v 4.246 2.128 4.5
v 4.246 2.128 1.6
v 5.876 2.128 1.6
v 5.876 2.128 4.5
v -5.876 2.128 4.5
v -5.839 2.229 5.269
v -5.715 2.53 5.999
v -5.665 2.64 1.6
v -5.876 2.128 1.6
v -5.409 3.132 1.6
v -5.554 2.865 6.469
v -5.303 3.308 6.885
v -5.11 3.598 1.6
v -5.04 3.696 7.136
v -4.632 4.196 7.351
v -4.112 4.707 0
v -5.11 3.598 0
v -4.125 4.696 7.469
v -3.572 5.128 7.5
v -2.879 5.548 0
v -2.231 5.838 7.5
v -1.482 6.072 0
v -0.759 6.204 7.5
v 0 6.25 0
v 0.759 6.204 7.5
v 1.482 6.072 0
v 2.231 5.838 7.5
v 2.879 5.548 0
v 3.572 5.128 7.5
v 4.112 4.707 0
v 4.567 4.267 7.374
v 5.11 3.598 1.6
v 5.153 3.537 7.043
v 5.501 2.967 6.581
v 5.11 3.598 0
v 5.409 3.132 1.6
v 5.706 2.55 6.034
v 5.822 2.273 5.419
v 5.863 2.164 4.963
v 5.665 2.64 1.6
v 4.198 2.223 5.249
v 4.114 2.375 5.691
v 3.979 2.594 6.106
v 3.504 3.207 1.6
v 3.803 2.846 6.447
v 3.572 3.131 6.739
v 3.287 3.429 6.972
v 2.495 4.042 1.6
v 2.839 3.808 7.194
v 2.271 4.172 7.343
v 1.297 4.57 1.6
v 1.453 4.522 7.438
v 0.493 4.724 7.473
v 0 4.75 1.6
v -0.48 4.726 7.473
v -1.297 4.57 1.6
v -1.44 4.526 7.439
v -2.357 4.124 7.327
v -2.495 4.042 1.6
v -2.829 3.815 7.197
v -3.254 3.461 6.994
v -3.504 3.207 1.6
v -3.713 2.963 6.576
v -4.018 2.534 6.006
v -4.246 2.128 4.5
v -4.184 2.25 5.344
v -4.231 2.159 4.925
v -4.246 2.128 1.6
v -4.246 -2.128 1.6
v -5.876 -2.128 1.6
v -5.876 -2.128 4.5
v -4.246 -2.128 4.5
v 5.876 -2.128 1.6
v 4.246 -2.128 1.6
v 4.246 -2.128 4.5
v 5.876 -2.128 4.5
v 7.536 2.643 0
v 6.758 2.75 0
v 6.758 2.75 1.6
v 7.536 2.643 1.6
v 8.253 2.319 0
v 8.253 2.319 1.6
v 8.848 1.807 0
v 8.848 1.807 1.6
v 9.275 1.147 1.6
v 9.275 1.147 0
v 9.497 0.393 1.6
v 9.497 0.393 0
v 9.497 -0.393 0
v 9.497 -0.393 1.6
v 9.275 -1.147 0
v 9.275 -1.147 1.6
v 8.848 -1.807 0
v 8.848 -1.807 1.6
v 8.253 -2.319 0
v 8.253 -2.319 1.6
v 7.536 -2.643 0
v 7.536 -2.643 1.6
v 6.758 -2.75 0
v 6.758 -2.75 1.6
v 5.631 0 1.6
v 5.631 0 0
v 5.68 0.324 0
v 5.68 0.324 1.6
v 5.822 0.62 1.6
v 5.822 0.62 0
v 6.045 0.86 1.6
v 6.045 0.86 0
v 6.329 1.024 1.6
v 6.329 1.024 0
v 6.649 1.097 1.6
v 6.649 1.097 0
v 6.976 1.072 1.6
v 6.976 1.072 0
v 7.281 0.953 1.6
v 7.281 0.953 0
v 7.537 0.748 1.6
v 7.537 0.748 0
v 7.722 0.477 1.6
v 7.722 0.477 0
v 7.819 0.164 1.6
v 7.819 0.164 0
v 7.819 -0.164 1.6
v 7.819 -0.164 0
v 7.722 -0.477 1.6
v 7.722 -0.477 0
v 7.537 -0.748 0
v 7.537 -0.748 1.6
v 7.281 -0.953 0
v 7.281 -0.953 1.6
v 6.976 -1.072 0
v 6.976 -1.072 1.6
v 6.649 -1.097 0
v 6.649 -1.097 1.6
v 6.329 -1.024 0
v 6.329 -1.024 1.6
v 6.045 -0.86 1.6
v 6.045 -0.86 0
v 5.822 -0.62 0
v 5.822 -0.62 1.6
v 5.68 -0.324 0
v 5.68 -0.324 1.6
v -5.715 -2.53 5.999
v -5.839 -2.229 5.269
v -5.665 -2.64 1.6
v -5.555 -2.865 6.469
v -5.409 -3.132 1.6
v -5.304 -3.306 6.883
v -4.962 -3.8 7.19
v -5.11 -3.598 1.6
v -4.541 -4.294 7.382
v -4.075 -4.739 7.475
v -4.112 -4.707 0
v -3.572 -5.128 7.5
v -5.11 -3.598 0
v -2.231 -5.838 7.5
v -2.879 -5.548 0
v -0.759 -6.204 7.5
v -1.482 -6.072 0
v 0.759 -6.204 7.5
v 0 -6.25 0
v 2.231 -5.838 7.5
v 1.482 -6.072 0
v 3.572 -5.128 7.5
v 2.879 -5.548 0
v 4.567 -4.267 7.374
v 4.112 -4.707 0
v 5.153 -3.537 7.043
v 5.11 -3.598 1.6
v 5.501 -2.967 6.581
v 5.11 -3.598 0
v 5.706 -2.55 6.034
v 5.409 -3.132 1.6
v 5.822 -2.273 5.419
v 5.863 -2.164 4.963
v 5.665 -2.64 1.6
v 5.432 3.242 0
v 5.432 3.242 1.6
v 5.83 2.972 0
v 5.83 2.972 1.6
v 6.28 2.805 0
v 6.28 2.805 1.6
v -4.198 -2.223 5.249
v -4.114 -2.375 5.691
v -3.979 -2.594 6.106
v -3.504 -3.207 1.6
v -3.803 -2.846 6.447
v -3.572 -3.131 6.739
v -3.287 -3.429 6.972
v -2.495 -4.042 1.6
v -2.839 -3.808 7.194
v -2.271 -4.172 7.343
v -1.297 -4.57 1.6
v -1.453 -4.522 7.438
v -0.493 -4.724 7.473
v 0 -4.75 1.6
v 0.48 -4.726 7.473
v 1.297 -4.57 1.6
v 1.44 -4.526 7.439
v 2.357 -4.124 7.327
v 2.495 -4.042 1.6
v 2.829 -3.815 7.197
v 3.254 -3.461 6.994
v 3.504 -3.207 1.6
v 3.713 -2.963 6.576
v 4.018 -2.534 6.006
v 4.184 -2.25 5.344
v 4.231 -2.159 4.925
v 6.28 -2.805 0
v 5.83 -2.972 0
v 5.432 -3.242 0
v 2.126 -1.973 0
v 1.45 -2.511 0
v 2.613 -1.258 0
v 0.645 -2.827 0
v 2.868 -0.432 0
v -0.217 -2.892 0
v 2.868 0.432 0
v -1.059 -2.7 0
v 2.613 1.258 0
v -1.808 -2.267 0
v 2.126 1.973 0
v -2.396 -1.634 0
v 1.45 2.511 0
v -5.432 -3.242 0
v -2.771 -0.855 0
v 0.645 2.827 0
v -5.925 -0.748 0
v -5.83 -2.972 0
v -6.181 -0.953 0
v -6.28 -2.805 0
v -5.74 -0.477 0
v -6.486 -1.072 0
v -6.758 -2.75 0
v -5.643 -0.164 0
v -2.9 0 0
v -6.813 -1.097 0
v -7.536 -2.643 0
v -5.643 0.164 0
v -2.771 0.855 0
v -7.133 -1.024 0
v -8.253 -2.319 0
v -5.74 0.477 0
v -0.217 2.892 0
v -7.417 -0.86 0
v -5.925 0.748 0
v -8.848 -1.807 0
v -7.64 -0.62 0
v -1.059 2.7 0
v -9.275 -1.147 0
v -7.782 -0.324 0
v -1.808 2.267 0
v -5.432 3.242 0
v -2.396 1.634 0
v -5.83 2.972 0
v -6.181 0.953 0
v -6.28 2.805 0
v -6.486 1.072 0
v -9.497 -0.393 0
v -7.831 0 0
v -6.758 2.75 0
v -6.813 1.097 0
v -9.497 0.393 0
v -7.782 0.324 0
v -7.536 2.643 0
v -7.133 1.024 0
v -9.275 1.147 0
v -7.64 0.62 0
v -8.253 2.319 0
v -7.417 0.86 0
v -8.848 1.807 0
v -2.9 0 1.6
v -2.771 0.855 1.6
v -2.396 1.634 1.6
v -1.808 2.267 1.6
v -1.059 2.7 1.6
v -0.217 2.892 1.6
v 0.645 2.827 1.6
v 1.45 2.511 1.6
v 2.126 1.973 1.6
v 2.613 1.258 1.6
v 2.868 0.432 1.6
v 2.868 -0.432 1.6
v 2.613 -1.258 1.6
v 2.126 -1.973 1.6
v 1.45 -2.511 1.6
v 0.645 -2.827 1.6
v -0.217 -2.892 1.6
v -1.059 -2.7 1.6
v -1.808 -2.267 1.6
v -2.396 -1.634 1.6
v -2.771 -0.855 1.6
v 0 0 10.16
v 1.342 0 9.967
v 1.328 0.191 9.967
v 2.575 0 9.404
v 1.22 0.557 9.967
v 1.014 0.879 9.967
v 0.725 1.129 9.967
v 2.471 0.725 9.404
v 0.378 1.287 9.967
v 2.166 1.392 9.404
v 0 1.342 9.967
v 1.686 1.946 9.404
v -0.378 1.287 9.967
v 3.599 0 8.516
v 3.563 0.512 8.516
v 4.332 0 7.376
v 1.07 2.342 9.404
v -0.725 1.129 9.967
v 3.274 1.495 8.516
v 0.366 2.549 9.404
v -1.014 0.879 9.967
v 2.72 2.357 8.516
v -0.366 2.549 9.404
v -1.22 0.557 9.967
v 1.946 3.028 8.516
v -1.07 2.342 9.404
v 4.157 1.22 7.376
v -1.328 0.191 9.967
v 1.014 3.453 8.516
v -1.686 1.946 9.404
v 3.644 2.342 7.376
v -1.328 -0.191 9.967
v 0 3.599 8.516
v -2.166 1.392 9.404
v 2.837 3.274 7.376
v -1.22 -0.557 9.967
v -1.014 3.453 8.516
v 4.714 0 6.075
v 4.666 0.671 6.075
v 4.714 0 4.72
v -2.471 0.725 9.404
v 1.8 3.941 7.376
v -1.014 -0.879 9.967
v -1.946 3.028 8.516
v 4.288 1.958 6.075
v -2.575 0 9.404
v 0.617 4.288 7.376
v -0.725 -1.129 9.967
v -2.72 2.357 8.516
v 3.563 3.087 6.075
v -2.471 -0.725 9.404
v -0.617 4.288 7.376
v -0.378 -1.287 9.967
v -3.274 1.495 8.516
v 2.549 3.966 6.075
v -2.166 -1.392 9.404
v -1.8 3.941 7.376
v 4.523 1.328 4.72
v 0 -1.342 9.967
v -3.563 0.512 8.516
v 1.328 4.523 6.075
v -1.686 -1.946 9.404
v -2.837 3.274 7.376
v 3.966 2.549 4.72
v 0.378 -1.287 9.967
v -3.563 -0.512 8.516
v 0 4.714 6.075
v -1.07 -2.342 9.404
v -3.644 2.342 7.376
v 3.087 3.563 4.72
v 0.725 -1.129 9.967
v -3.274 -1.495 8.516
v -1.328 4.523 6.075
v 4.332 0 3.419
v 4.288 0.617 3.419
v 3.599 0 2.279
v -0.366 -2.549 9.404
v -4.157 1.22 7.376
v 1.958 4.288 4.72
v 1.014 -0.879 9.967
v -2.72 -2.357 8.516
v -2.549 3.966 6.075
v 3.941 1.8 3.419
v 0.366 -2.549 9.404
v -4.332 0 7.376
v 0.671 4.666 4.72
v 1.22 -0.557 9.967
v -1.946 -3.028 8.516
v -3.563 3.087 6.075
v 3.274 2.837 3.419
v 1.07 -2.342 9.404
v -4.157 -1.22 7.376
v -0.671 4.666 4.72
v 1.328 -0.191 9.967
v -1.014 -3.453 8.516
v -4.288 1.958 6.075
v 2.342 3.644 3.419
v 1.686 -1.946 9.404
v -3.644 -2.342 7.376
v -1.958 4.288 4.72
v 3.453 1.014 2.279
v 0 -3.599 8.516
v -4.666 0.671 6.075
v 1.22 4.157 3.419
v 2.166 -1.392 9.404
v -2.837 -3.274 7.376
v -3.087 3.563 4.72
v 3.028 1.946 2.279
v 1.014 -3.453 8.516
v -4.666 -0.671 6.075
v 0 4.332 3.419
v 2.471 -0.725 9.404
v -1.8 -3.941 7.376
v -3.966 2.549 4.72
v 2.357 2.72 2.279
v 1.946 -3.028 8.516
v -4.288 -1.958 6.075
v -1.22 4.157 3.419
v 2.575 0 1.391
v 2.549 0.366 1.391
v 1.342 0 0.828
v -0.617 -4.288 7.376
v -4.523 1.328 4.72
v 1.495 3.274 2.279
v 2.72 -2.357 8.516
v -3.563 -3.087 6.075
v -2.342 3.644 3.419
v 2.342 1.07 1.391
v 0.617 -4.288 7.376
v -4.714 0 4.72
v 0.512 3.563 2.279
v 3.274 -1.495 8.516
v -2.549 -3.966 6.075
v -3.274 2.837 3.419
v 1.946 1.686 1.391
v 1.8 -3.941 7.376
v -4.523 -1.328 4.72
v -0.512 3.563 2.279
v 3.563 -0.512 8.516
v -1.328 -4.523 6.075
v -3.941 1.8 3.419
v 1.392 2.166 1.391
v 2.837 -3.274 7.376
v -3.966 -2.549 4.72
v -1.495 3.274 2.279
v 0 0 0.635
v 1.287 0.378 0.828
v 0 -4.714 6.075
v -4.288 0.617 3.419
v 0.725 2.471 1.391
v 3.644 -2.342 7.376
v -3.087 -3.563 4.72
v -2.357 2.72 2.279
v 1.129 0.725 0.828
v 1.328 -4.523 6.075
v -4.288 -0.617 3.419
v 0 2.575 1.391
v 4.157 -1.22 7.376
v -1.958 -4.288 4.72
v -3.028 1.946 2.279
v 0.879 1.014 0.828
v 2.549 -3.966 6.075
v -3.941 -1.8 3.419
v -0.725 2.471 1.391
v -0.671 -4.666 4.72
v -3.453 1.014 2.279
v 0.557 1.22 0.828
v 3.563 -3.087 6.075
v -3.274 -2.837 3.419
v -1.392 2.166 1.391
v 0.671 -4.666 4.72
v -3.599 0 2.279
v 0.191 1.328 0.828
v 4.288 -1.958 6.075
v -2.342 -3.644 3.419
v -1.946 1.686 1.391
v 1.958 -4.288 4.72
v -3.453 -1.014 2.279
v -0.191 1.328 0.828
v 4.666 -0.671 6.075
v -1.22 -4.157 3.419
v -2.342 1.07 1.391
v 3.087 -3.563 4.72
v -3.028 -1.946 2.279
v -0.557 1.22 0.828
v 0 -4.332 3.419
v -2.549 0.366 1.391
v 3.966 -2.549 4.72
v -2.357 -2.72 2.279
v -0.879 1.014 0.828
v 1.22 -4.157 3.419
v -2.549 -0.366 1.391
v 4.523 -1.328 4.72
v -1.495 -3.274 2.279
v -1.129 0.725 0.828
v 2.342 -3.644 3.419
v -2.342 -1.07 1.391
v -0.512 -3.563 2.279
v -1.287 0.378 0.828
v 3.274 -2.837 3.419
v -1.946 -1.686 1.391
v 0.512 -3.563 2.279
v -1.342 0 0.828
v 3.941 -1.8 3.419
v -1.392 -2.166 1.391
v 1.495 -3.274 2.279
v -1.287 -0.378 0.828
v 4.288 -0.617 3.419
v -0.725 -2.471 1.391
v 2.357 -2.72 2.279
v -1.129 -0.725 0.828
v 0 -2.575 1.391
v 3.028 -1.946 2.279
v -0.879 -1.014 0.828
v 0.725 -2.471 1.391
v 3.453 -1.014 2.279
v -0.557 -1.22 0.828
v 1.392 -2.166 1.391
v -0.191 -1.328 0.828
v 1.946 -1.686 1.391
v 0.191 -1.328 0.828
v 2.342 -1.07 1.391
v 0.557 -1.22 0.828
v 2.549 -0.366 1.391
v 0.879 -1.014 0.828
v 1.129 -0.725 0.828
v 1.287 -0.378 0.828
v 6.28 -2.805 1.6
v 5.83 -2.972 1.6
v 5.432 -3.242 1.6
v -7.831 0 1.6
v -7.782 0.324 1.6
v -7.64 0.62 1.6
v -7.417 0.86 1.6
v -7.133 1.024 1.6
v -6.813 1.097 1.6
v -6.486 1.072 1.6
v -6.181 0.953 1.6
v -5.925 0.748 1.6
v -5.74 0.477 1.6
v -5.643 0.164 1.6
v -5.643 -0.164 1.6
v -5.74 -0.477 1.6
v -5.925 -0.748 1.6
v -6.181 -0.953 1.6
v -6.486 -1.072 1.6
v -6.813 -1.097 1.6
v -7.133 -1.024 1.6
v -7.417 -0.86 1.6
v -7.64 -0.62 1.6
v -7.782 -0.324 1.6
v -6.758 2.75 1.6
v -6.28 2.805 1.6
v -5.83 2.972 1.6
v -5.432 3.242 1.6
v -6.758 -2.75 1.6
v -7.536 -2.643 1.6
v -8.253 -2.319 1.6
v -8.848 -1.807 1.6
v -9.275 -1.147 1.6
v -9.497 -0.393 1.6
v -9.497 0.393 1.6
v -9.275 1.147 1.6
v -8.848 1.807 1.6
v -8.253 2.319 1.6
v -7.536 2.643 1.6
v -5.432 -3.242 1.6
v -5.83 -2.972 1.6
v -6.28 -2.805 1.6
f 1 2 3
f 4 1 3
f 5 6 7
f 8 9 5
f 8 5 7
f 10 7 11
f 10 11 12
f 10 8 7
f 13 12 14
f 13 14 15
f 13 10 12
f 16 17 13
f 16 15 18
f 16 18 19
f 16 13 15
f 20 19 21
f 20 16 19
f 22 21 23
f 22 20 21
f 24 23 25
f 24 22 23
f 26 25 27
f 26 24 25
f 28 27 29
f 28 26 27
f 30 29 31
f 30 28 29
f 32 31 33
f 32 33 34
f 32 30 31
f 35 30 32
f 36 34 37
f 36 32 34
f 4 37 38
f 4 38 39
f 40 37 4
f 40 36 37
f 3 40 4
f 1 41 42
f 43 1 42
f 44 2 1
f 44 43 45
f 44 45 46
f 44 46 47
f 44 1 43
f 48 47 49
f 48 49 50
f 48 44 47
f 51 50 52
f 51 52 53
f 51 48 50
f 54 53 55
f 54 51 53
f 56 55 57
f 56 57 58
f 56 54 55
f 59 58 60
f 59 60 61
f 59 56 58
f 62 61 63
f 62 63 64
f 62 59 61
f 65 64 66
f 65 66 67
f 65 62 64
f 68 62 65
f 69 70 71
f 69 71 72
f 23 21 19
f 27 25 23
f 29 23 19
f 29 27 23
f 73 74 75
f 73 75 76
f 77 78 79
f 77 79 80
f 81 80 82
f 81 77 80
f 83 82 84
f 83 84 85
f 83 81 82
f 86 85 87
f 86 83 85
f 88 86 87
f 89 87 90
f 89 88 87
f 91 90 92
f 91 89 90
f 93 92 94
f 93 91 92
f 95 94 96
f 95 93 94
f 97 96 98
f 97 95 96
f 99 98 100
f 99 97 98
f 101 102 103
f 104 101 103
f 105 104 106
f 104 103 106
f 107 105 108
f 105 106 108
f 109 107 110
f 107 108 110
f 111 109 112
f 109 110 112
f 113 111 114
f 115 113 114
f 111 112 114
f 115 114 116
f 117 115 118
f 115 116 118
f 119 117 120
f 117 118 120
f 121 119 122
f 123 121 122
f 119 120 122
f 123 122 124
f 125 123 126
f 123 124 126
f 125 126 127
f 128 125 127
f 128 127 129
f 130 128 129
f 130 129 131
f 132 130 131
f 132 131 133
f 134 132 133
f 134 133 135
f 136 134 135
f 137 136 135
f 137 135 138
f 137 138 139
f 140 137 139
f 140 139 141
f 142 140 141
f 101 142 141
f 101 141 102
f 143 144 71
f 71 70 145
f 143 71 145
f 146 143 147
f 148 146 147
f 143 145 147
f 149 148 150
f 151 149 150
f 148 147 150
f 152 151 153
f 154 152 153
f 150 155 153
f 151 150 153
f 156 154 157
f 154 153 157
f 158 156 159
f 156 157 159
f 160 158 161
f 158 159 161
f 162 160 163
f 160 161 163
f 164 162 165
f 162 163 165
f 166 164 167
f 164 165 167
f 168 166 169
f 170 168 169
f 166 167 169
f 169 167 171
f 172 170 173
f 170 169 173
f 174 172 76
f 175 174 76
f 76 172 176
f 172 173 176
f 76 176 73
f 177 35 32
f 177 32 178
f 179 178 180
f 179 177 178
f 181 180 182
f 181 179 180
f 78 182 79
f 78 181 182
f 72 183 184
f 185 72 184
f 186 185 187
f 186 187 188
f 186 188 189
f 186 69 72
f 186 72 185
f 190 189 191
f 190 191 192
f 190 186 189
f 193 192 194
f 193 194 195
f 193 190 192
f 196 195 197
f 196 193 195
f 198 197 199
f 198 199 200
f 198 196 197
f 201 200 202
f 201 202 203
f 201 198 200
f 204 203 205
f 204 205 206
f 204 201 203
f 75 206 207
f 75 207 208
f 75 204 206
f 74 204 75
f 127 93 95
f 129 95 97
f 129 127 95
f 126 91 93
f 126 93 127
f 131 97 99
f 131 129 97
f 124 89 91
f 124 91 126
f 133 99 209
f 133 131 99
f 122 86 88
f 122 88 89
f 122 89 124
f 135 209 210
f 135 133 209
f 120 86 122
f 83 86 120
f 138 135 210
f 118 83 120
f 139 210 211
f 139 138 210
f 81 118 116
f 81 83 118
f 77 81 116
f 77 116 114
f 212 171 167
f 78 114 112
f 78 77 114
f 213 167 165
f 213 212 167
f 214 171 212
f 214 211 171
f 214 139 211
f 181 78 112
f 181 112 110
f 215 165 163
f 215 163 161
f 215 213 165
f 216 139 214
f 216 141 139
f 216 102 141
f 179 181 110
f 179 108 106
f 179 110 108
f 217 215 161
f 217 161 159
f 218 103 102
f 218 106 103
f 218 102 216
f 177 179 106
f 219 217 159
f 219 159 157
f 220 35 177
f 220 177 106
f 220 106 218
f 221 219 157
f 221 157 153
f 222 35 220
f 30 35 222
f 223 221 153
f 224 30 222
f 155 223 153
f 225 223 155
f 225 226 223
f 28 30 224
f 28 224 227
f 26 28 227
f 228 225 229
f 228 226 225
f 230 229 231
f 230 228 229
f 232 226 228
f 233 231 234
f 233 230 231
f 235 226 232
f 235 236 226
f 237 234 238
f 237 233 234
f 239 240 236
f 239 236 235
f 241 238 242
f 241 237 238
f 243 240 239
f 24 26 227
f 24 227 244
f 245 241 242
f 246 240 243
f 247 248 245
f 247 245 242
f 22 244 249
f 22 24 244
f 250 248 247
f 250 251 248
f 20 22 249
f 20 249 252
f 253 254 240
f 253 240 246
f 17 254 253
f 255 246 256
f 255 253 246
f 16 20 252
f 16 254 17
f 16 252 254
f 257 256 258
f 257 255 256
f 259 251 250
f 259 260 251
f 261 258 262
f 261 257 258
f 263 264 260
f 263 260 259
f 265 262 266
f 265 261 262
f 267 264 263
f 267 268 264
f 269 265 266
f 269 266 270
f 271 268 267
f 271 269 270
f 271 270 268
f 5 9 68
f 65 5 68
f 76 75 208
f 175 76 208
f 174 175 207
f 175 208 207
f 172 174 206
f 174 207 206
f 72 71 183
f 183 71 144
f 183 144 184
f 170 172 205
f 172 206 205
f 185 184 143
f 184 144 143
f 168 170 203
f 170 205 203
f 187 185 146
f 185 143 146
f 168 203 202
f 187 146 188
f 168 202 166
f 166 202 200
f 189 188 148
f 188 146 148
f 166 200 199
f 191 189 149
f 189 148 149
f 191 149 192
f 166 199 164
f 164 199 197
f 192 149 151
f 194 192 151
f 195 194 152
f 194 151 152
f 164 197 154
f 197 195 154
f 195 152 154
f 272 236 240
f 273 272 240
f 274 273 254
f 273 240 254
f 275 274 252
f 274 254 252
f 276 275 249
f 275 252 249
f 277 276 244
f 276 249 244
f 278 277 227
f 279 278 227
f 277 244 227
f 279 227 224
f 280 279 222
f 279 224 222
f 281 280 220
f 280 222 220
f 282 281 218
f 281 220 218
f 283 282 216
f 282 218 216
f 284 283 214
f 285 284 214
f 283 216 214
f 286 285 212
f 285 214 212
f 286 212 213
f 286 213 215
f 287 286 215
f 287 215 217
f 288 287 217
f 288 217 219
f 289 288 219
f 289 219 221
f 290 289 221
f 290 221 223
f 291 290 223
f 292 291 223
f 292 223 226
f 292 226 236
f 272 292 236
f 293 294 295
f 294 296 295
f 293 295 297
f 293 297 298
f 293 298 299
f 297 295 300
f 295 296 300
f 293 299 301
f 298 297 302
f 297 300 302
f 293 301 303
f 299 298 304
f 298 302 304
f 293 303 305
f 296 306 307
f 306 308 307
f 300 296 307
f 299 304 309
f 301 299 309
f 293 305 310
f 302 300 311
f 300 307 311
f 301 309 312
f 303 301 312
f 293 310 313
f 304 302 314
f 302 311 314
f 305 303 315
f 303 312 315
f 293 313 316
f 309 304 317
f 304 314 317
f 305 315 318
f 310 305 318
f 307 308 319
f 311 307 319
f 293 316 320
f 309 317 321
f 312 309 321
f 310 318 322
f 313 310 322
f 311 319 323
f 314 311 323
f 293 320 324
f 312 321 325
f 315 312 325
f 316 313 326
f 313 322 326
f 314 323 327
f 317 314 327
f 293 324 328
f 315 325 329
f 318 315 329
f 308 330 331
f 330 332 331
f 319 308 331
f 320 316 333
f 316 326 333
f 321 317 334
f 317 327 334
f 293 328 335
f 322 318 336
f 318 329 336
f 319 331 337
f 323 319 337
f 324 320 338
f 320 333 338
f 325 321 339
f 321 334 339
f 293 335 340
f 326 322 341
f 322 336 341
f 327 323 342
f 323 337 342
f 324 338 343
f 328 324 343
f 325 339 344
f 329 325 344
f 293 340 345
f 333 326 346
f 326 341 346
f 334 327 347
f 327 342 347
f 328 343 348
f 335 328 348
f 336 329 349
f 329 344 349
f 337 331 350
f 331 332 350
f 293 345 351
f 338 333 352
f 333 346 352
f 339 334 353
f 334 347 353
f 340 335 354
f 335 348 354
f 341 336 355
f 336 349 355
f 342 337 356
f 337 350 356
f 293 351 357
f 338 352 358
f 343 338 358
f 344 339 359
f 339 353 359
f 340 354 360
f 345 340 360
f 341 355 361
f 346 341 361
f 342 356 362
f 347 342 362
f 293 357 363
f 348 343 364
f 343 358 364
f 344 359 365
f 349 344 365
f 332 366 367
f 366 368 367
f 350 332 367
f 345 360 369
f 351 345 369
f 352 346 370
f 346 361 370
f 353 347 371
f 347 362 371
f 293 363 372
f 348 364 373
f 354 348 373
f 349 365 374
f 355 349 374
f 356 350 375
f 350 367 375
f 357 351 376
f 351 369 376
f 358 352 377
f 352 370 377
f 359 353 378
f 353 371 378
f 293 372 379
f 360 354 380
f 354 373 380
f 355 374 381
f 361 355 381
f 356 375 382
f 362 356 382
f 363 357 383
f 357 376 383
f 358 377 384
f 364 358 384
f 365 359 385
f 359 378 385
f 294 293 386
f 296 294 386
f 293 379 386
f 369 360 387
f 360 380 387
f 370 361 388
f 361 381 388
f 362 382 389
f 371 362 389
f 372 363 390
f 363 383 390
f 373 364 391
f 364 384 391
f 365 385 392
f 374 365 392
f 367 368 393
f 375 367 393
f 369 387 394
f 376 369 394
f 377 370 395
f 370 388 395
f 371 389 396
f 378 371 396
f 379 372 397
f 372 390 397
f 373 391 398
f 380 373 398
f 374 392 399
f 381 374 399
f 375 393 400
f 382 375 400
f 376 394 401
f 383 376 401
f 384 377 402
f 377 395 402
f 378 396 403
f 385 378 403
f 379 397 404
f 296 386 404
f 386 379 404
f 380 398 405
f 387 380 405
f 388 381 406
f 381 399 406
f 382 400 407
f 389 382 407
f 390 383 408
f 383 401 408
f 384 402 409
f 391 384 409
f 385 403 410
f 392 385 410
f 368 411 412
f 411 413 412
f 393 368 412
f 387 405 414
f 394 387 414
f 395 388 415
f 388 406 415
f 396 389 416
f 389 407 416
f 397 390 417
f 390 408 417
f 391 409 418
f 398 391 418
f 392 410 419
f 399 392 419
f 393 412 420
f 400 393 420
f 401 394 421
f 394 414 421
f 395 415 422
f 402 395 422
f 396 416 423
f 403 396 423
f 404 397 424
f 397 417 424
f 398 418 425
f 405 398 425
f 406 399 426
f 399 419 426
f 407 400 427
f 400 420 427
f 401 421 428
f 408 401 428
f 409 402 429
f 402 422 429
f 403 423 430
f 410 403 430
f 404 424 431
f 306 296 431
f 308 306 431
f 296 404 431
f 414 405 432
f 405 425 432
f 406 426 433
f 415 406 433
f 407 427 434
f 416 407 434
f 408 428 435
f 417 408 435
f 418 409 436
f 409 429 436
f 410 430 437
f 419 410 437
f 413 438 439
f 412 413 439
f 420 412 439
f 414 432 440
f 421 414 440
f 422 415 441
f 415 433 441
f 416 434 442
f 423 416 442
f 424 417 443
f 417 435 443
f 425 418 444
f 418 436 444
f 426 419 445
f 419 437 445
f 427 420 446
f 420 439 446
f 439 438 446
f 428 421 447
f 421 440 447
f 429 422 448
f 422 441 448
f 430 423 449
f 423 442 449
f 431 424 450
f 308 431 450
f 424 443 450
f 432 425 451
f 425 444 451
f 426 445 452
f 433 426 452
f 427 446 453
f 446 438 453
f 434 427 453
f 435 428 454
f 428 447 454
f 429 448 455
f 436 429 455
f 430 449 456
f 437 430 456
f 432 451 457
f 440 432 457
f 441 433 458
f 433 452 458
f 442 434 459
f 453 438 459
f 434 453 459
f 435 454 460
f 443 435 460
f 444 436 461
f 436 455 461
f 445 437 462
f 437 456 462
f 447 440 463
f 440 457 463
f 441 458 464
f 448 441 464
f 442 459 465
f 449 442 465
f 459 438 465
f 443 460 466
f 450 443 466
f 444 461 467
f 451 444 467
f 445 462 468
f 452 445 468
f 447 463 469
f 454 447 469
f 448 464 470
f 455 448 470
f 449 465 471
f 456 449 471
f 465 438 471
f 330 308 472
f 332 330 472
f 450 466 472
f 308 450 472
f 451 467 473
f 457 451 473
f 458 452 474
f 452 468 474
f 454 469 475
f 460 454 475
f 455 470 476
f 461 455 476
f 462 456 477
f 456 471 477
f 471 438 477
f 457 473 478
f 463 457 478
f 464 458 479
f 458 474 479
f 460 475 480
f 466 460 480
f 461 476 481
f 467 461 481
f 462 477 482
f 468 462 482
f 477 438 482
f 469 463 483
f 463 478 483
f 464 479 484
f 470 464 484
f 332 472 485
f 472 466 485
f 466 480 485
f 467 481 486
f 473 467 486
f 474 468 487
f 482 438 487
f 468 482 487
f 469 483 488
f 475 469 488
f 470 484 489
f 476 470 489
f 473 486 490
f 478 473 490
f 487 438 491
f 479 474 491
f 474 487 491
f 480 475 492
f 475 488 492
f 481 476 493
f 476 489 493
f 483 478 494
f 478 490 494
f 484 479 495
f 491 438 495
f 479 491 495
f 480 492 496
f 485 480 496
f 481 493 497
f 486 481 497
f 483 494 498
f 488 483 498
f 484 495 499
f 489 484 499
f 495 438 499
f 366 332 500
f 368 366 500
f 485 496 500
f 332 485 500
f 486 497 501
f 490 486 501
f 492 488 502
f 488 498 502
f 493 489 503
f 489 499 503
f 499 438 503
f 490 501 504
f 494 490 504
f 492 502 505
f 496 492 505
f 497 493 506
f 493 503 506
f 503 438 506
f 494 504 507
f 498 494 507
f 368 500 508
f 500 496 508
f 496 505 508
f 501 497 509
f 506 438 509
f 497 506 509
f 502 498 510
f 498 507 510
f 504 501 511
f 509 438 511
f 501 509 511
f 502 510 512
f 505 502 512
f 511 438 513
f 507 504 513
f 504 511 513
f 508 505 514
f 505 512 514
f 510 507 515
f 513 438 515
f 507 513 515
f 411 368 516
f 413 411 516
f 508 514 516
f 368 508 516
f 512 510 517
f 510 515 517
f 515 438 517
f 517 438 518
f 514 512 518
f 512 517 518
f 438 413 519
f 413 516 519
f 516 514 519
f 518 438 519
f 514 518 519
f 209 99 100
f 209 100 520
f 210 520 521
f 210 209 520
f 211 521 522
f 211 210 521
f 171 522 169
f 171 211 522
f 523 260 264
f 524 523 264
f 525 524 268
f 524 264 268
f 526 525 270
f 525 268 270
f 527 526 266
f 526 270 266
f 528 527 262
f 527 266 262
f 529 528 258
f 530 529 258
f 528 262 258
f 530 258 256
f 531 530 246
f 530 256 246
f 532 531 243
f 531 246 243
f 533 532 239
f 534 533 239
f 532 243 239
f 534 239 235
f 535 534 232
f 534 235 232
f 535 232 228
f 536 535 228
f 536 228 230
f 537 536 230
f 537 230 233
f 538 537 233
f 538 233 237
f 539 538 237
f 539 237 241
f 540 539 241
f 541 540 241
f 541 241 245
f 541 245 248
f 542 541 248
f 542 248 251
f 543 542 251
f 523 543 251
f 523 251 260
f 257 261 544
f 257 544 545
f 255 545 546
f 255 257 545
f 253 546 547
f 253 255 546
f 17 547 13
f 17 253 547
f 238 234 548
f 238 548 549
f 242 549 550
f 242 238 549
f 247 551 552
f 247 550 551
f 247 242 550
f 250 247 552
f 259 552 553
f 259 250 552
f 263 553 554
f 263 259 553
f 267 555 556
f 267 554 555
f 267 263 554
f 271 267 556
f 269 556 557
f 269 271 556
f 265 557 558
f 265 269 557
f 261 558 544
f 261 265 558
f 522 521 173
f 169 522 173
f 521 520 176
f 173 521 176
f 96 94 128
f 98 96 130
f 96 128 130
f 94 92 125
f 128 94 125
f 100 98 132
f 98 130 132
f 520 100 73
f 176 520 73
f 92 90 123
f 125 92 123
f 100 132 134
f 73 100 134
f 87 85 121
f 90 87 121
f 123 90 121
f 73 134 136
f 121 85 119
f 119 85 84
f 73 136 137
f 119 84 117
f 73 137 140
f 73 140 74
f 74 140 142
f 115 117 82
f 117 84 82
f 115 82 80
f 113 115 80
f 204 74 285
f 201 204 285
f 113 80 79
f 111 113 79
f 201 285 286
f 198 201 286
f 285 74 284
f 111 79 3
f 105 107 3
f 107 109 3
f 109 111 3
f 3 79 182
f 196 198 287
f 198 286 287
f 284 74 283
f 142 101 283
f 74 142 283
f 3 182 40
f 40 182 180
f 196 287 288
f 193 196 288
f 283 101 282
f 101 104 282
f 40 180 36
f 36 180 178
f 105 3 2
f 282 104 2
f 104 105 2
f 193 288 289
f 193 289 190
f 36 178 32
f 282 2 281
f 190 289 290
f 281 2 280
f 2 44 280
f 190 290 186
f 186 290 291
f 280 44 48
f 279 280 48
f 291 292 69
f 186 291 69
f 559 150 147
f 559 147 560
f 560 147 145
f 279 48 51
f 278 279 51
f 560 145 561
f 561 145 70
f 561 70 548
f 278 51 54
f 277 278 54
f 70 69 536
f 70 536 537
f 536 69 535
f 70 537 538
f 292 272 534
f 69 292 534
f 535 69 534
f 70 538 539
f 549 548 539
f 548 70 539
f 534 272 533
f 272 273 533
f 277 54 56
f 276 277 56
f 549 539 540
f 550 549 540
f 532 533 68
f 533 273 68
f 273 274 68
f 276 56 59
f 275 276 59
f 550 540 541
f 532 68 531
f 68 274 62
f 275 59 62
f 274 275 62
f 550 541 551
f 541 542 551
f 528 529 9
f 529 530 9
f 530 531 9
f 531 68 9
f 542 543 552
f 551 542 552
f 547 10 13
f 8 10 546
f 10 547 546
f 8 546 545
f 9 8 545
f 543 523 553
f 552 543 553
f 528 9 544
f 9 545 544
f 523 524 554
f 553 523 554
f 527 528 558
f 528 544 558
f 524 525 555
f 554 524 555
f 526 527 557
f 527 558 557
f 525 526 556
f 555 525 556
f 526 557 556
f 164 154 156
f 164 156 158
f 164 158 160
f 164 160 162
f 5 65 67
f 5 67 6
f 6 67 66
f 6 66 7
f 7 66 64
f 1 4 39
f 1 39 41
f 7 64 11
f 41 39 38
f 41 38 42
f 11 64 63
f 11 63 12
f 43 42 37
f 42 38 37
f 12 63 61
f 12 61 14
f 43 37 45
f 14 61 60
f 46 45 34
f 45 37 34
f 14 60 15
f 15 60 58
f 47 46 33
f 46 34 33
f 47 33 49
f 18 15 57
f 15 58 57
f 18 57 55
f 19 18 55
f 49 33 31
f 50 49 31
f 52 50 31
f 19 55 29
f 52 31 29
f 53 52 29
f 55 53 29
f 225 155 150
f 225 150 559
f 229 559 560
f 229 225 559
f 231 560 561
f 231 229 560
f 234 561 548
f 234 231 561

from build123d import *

# Parameters (mm, degrees)
SKETCH1_R           = 6.25
SKETCH1_R_2         = 4.750000000000001
BOSS_EXTRUDE1_DEPTH = 7.5
SKETCH2_R           = 2.9
BOSS_EXTRUDE2_DEPTH = 1.6
SKETCH4_W           = 17.032561562560232
SKETCH4_H           = 4.256966638696863
CUT_EXTRUDE1_DEPTH  = 5.9
FILLET1_R           = 3
SKETCH5_R           = 1.1
SKETCH5_R_2         = 1.0999999999999992
CUT_EXTRUDE2_DEPTH  = 14.63957945649352


with BuildPart() as part:
    # Sketch1 → Boss-Extrude1 (new body)
    with BuildSketch(Plane.XY):
        Circle(SKETCH1_R)
        Circle(SKETCH1_R_2, mode=Mode.SUBTRACT)
    extrude(amount=BOSS_EXTRUDE1_DEPTH)

    # Sketch2 → Boss-Extrude2 (add)
    with BuildSketch(Plane(origin=(0, 0, 0), x_dir=(-1, 0, 0), z_dir=(0, 0, -1))):
        with BuildLine():
            ThreePointArc((-6.757882598562828, 2.7499467257690724), (-9.525000000000002, 3.4e-16), (-6.757882598562828, -2.7499467257690724))
            ThreePointArc((-6.757882598562828, -2.7499467257690724), (-5.829818598679689, -2.9718052821530714), (-5.110176954042268, -3.5984151370256456))
            ThreePointArc((-5.110176954042268, -3.5984151370256456), (3.8e-16, -6.250000000000001), (5.110176954042268, -3.5984151370256447))
            ThreePointArc((5.110176954042268, -3.5984151370256447), (5.829818598679689, -2.9718052821530705), (6.757882598562827, -2.7499467257690715))
            ThreePointArc((6.757882598562827, -2.7499467257690715), (9.525, 0), (6.757882598562827, 2.7499467257690715))
            ThreePointArc((6.757882598562827, 2.7499467257690715), (5.829818598679689, 2.9718052821530705), (5.110176954042268, 3.5984151370256447))
            ThreePointArc((5.110176954042268, 3.5984151370256447), (3.8e-16, 6.25), (-5.110176954042268, 3.5984151370256456))
            ThreePointArc((-5.110176954042268, 3.5984151370256456), (-5.829818598679689, 2.9718052821530714), (-6.757882598562828, 2.7499467257690724))
        make_face()
        Circle(SKETCH2_R, mode=Mode.SUBTRACT)
    extrude(amount=-BOSS_EXTRUDE2_DEPTH)

    # Sketch4 → Cut-Extrude1 (cut)
    with BuildSketch(Plane.XY.offset(7.5)):
        Rectangle(SKETCH4_W, SKETCH4_H)
    extrude(amount=-CUT_EXTRUDE1_DEPTH, mode=Mode.SUBTRACT)

    # Fillet1
    # the kernel refuses this fillet: 3 mm, written as the material it takes off along each edge
    with BuildSketch(Plane(origin=(-13.376398451369308, -2.1284833193484314, 7.5), x_dir=(0, 0, -1), z_dir=(1, 0, 0))) as fillet1_piece_1:
        with BuildLine():
            CenterArc((FILLET1_R, -FILLET1_R), FILLET1_R, 90, 90)
            Line((0, -FILLET1_R), (0, 0))
            Line((0, 0), (FILLET1_R, 0))
        make_face()
    extrude(amount=16.629981284008707, mode=Mode.SUBTRACT)
    with BuildSketch(Plane(origin=(-3.253582832639439, -2.1284833193484314, 7.5), x_dir=(0, -1, 0), z_dir=(1, 0, 0))) as fillet1_piece_2:
        with BuildLine():
            CenterArc((FILLET1_R, FILLET1_R), FILLET1_R, 180, 90)
            Line((0, FILLET1_R), (0, 0))
            Line((0, 0), (FILLET1_R, 0))
        make_face()
    extrude(amount=16.629981284008785, mode=Mode.SUBTRACT)
    with BuildSketch(Plane(origin=(13.376398451369345, 2.1284833193484314, 7.5), x_dir=(0, 0, -1), z_dir=(-1, 0, 0))) as fillet1_piece_3:
        with BuildLine():
            CenterArc((FILLET1_R, -FILLET1_R), FILLET1_R, 90, 90)
            Line((0, -FILLET1_R), (0, 0))
            Line((0, 0), (FILLET1_R, 0))
        make_face()
    extrude(amount=16.629981284008785, mode=Mode.SUBTRACT)
    with BuildSketch(Plane(origin=(3.253582832639398, 2.1284833193484314, 7.5), x_dir=(0, 1, 0), z_dir=(-1, 0, 0))) as fillet1_piece_4:
        with BuildLine():
            CenterArc((FILLET1_R, FILLET1_R), FILLET1_R, 180, 90)
            Line((0, FILLET1_R), (0, 0))
            Line((0, 0), (FILLET1_R, 0))
        make_face()
    extrude(amount=16.629981284008707, mode=Mode.SUBTRACT)

    # Sketch5 → Cut-Extrude2 (cut, through all)
    with BuildSketch(Plane(origin=(0, 0, 0), x_dir=(-1, 0, 0), z_dir=(0, 0, -1))):
        with Locations((-6.731, 0)):
            Circle(SKETCH5_R)
        with Locations((6.731, 0)):
            Circle(SKETCH5_R_2)
    extrude(amount=-CUT_EXTRUDE2_DEPTH, mode=Mode.SUBTRACT)


with BuildPart() as body_2:
    # Sketch6 → Revolve1 (revolve)
    with BuildSketch(Plane(origin=(0, 0, 0), x_dir=(1, 0, 0), z_dir=(0, 1, 0))):
        with BuildLine():
            Line((1.79e-15, -0.6350000000000001), (2.37e-15, -10.16))
            ThreePointArc((2.37e-15, -10.16), (4.762500000000002, -5.3975), (1.79e-15, -0.6350000000000001))
        make_face()
    revolve(axis=Axis((1.79e-15, 0, 0.6350000000000001), (6e-17, 0, 1)))


solid = Compound([part.part, body_2.part])
